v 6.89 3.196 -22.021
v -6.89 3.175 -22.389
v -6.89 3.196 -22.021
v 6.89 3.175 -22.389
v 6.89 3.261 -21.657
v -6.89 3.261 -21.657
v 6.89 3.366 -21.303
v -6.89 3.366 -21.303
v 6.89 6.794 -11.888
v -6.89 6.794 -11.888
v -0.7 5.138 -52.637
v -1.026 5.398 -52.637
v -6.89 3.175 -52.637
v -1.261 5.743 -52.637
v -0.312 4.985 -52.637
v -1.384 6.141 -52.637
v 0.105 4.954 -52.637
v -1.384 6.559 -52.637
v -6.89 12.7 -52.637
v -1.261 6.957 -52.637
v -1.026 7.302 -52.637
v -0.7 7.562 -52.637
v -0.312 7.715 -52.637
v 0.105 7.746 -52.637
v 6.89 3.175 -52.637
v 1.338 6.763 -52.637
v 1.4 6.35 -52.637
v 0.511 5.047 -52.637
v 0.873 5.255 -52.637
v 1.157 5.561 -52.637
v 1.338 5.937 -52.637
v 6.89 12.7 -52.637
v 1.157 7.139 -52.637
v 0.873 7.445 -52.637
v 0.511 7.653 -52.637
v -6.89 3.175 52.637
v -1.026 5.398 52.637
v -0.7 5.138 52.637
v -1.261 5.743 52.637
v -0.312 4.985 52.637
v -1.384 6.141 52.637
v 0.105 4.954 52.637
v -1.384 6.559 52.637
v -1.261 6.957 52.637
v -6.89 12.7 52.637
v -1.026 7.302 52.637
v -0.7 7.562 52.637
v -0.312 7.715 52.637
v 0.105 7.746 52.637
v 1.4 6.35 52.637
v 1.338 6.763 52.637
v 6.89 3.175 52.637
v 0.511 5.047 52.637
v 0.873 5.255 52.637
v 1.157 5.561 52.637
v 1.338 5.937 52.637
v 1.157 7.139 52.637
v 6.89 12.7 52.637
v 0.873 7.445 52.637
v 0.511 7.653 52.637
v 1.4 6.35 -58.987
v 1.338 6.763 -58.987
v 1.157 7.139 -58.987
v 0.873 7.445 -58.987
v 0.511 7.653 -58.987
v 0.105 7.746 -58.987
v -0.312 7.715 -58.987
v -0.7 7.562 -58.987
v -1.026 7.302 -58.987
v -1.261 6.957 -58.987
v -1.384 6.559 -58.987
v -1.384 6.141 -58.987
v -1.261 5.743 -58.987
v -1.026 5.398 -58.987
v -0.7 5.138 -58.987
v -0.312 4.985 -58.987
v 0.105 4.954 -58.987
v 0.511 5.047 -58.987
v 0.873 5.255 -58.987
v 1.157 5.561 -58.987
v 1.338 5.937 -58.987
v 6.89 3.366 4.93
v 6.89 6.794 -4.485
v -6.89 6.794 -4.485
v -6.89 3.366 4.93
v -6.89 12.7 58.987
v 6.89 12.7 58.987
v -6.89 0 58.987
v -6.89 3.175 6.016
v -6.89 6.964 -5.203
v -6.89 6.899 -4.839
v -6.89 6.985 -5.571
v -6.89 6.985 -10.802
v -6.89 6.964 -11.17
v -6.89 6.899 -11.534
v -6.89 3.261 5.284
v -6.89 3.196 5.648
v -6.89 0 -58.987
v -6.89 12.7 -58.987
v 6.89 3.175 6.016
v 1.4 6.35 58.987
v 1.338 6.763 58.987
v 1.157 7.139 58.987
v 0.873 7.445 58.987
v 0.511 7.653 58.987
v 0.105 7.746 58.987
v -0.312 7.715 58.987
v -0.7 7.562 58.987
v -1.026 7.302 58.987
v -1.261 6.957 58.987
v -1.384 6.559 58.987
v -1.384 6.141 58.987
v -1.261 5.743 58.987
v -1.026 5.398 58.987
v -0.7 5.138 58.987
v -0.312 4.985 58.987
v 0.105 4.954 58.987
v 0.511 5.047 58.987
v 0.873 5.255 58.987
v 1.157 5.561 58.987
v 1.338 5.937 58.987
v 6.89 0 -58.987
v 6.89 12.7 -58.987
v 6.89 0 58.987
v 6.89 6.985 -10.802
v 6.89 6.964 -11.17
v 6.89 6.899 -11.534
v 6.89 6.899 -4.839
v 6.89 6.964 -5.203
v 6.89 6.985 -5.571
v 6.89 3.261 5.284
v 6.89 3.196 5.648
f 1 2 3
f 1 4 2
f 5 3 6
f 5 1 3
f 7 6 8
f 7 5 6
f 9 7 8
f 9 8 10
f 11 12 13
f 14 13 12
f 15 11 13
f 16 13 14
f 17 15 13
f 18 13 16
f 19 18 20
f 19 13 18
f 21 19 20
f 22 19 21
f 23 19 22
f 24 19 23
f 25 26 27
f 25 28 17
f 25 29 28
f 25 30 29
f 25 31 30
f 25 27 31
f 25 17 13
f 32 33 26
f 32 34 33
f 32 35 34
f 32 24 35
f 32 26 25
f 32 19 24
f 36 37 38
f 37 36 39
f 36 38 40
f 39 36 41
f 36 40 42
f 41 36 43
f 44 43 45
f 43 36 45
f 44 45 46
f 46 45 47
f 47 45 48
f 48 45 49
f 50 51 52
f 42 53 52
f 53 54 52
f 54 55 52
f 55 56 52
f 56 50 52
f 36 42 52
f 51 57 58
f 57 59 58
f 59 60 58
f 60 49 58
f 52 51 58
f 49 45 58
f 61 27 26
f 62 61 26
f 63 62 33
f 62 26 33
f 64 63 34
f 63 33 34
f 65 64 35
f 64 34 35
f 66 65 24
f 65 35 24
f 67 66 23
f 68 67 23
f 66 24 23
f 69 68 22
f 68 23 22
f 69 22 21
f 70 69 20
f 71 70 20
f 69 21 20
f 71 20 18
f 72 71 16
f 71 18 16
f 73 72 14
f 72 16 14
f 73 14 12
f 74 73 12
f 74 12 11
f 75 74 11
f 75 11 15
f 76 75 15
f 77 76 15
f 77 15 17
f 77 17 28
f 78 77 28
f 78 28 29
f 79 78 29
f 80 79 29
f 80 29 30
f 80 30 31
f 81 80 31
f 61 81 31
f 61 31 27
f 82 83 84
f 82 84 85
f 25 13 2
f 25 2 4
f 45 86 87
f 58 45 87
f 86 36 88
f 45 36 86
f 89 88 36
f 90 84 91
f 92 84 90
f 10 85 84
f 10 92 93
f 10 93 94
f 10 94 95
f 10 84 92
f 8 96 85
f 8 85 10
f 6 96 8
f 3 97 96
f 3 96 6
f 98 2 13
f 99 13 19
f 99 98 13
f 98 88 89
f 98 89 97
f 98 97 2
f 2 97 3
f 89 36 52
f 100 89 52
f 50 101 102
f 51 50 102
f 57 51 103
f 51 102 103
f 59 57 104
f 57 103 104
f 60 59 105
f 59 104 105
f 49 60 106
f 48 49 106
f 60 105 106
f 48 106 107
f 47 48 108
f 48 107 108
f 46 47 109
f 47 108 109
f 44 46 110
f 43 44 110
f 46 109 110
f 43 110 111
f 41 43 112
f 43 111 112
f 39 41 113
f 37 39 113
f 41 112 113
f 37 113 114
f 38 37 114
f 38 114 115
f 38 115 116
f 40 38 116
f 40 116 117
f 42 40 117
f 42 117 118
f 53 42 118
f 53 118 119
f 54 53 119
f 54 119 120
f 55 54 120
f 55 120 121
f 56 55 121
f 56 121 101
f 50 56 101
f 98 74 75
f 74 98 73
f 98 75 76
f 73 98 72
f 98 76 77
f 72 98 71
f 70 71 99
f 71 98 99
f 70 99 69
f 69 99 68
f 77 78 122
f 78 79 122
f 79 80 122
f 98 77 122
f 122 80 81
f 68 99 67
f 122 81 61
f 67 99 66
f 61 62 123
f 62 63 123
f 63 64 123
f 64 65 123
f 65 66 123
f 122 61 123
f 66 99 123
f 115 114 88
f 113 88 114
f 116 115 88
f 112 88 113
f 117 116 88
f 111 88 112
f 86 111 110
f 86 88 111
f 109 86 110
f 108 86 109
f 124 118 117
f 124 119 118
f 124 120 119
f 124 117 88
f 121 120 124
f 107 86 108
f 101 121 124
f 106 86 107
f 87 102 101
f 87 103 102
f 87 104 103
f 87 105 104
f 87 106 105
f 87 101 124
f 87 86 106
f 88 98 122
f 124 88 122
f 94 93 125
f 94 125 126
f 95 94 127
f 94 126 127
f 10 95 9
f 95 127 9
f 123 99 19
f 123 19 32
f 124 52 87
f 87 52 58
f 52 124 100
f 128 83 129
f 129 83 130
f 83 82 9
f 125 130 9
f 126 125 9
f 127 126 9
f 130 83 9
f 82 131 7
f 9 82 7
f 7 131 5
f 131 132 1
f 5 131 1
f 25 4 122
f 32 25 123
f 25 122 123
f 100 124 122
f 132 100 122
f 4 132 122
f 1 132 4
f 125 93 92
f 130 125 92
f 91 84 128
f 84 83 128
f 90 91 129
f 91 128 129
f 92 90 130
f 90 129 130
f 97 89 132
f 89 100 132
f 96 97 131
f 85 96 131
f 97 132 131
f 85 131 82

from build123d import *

# Parameters (mm, degrees)
SKETCH1_W           = 13.7795
SKETCH1_H           = 117.97300002
BOSS_EXTRUDE1_DEPTH = 3.175
SKETCH5_W           = 13.7795
SKETCH5_H           = 9.525
BOSS_EXTRUDE2_DEPTH = 6.35
SKETCH4_R           = 1.399999994
CUT_EXTRUDE1_DEPTH  = 118.97300002
BOSS_EXTRUDE3_DEPTH = 13.7795
FILLET1_R           = 3.175


with BuildPart() as part:
    # Sketch1 → Boss-Extrude1 (new body)
    with BuildSketch(Plane(origin=(0, 0, 0), x_dir=(1, 0, 0), z_dir=(0, 1, 0))):
        Rectangle(SKETCH1_W, SKETCH1_H)
    extrude(amount=BOSS_EXTRUDE1_DEPTH)

    # Sketch5 → Boss-Extrude2 (add)
    with BuildSketch(Plane.XY.offset(58.98650001)):
        with Locations((0, 7.9375)):
            Rectangle(SKETCH5_W, SKETCH5_H)
    boss_extrude2 = extrude(amount=-BOSS_EXTRUDE2_DEPTH)

    # Mirror1: Boss-Extrude2 across plane
    add(boss_extrude2.mirror(Plane.XY))

    # Sketch4 → Cut-Extrude1 (cut, through all)
    with BuildSketch(Plane.XY.offset(58.98650001)):
        with Locations((0, 6.35)):
            Circle(SKETCH4_R)
    extrude(amount=-CUT_EXTRUDE1_DEPTH, mode=Mode.SUBTRACT)

    # Sketch6 → Boss-Extrude3 (add)
    with BuildSketch(Plane.ZY.offset(6.88975)):
        Polygon((-11.36150001, 6.985), (-5.01150001, 6.985), (5.456388958, 3.175), (-21.829388978, 3.175), align=None)
    extrude(amount=-BOSS_EXTRUDE3_DEPTH)

    # Fillet1
    fillet1_edges = [part.edges().sort_by_distance(p)[0] for p in [
        (0, 3.175, -21.829388978),
        (0, 6.985, -11.36150001),
        (0, 6.985, -5.01150001),
        (0, 3.175, 5.456388958),
    ]]
    fillet(fillet1_edges, radius=FILLET1_R)


solid = part.part
